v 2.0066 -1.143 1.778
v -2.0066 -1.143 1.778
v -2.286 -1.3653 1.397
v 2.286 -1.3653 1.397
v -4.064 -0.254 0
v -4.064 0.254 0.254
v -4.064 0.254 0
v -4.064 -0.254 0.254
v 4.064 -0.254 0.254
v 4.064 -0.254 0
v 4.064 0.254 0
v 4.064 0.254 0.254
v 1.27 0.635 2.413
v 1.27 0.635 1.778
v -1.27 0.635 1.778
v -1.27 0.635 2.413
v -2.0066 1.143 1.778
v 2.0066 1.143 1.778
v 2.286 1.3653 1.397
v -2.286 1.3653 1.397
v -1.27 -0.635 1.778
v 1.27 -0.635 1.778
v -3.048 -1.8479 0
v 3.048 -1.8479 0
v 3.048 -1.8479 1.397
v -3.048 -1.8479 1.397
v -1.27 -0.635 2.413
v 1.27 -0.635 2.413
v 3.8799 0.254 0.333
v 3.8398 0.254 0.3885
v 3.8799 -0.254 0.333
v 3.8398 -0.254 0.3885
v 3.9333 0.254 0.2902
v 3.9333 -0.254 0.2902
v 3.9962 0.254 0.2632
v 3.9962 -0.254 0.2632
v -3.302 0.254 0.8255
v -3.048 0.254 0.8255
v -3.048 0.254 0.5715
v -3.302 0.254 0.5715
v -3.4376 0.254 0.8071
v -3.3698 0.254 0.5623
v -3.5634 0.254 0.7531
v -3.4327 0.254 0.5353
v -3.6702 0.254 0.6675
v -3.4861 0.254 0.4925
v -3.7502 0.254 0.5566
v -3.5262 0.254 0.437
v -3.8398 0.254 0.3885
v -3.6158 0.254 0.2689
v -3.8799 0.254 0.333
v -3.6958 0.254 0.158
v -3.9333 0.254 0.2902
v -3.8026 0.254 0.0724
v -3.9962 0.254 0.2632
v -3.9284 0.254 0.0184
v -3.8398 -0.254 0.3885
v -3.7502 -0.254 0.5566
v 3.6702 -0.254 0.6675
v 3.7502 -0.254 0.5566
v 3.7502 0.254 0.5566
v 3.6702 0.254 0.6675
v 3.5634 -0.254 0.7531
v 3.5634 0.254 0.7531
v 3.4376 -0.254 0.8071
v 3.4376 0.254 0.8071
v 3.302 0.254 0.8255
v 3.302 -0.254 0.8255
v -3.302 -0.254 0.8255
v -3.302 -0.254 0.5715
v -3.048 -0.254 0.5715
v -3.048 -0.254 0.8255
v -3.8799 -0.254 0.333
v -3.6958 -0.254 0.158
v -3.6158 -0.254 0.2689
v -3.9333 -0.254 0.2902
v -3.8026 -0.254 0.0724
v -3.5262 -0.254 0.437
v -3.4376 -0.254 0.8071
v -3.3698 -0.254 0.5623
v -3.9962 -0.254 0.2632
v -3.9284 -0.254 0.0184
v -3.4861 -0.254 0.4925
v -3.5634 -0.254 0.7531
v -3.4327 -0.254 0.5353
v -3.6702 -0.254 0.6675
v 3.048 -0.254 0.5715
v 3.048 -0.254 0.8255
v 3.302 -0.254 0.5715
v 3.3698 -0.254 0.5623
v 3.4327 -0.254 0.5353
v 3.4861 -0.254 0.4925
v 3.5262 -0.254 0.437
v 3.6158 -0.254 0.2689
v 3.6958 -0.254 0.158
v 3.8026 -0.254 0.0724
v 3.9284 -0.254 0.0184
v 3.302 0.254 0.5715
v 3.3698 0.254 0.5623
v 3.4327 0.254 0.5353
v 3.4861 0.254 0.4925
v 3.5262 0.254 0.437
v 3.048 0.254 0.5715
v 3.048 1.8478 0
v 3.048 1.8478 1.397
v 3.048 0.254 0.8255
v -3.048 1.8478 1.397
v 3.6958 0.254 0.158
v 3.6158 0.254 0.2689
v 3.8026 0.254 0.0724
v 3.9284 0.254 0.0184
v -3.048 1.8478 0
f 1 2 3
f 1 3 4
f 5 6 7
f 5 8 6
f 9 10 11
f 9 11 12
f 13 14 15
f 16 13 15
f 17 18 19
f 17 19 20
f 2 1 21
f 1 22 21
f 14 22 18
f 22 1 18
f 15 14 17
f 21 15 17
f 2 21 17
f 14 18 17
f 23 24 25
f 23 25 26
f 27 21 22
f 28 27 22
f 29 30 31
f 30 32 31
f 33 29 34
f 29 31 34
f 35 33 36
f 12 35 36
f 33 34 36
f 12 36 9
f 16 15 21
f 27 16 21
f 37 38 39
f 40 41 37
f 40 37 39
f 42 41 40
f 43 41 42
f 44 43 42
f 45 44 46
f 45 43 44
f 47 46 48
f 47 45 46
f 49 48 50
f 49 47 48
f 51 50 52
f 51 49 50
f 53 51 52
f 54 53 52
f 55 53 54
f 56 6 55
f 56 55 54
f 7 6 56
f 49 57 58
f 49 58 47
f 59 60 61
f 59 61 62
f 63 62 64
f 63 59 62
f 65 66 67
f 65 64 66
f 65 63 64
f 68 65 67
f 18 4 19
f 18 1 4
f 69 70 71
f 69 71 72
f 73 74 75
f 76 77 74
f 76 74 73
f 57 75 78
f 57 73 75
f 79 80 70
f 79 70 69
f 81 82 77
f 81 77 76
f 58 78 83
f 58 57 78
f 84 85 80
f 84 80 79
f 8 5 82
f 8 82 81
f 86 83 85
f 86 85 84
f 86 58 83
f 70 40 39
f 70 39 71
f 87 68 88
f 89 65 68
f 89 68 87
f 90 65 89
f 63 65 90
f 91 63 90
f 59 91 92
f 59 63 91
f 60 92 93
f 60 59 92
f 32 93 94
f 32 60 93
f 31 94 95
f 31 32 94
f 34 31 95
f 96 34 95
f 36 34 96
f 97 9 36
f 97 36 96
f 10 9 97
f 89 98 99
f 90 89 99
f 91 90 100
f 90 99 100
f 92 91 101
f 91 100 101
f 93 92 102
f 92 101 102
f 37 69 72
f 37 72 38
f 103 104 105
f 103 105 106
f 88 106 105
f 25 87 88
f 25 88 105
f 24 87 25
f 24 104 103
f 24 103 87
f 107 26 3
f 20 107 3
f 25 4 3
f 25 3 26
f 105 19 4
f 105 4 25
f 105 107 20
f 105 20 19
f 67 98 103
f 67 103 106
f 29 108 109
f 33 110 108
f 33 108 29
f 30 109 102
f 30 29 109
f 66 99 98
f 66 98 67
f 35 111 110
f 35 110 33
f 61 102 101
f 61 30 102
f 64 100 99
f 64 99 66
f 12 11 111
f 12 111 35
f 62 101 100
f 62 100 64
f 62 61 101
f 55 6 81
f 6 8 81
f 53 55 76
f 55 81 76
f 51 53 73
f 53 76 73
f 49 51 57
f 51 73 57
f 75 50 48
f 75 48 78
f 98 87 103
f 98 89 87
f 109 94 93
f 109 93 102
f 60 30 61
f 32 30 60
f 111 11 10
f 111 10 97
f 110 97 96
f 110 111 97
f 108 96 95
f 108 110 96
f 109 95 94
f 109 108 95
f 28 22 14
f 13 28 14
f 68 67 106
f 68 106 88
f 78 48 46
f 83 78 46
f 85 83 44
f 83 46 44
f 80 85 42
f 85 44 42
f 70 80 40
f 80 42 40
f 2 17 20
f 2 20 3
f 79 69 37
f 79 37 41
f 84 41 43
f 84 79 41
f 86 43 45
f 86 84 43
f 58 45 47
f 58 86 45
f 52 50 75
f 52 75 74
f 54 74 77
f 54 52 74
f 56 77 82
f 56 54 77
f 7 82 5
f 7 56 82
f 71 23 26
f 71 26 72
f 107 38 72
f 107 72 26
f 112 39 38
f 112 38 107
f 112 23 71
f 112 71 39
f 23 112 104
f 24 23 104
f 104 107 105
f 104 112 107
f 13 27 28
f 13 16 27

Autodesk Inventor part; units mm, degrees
ref_plane "YZ Plane" through (0, 0, 0) normal (1, 0, 0) x (0, 1, 0)
ref_plane "XZ Plane" through (0, 0, 0) normal (0, 1, 0) x (-1, 0, 0)
sketch "Sketch1" plane through (0, 0, 0) normal (0, 0, 1) x (1, 0, 0)
  line L0 (3.048, -1.8479) -> (-3.048, -1.8479)
  line L1 (-3.048, -1.8479) -> (-3.048, 1.8478)
  line L2 (-3.048, 1.8478) -> (3.048, 1.8478)
  line L3 (3.048, 1.8478) -> (3.048, -1.8479)
  line L4 (3.048, -1.8479) -> (-3.048, 1.8478) construction
  line L5 (-3.048, -1.8479) -> (3.048, 1.8478) construction
  point P0 (0, 0)
  dimension "d0" = 6.096
  dimension "d1" = 3.6957
extrude "Extrusion1" add sketch "Sketch1" along normal blind 1.397
sketch "Sketch2" plane through (0, 0, 1.397) normal (0, 0, 1) x (1, 0, 0)
  line L0 (2.286, 1.3653) -> (-2.286, 1.3653)
  line L1 (-2.286, 1.3653) -> (-2.286, -1.3653)
  line L2 (-2.286, -1.3653) -> (2.286, -1.3653)
  line L3 (2.286, -1.3653) -> (2.286, 1.3653)
  line L4 (2.286, 1.3653) -> (-2.286, -1.3653) construction
  line L5 (-2.286, 1.3653) -> (2.286, -1.3653) construction
  point P0 (0, 0)
  dimension "d4" = 4.572
  dimension "d5" = 2.7305
ref_plane "Work Plane1" through (0, 0, 1.778) normal (0, 0, 1) x (1, 0, 0)
sketch "Sketch3" plane through (0, 0, 1.778) normal (0, 0, 1) x (1, 0, 0)
  line L0 (2.0066, 1.143) -> (-2.0066, 1.143)
  line L1 (-2.0066, 1.143) -> (-2.0066, -1.143)
  line L2 (-2.0066, -1.143) -> (2.0066, -1.143)
  line L3 (2.0066, -1.143) -> (2.0066, 1.143)
  line L4 (2.0066, 1.143) -> (-2.0066, -1.143) construction
  line L5 (-2.0066, 1.143) -> (2.0066, -1.143) construction
  point P0 (0, 0)
  dimension "d7" = 4.0132
  dimension "d8" = 2.286
loft "Loft1" add profiles "Sketch2", "Sketch3"
sketch "Sketch4" plane through (-2.0066, 1.143, 1.778) normal (0, 0, 1) x (1, 0, 0)
  line L0 (3.2766, -0.508) -> (0.7366, -0.508)
  line L1 (0.7366, -0.508) -> (0.7366, -1.778)
  line L2 (0.7366, -1.778) -> (3.2766, -1.778)
  line L3 (3.2766, -1.778) -> (3.2766, -0.508)
  line L4 (3.2766, -0.508) -> (0.7366, -1.778) construction
  line L5 (0.7366, -0.508) -> (3.2766, -1.778) construction
  point P0 (2.0066, -1.143)
  dimension "d13" = 2.54
  dimension "d14" = 1.27
extrude "Extrusion2" add sketch "Sketch4" along normal blind 0.635
sketch "Sketch5" plane through (0, 0, 0) normal (0, 1, 0) x (-1, 0, 0)
  line L0 (-3.048, 0) -> (-3.048, 1.397) construction
  line L1 (-3.048, 0.6985) -> (-3.302, 0.6985)
  arc A0 (-3.302, 0.6985) -> (-3.6382, 0.4968) centre (-3.302, 0.3175) ccw
  line L2 (-3.6382, 0.4968) -> (-3.7278, 0.3287)
  arc A1 (-4.064, 0.127) -> (-3.7278, 0.3287) centre (-4.064, 0.508) ccw
  line L3 (3.048, 0) -> (-3.048, 0) projected
  point P0 (0, 0)
  dimension "d17" = 1.016
  dimension "d18" = 0.127
  dimension "d19" = 0.254
  dimension "d20" = 0.381
sketch "Sketch6" plane through (3.048, -1.8479, 0) normal (1, 0, 0) x (0, 0, -1)
  line L0 (0, 0) -> (-1.397, 0) projected
  line L1 (-1.397, 0) -> (-1.397, 3.6957) projected
  line L2 (-0.8255, 2.1019) -> (-0.5715, 2.1019)
  line L3 (-0.5715, 2.1019) -> (-0.5715, 1.5939)
  line L4 (-0.5715, 1.5939) -> (-0.8255, 1.5939)
  line L5 (-0.8255, 1.5939) -> (-0.8255, 2.1019)
  line L6 (-0.8255, 2.1019) -> (-0.5715, 1.5939) construction
  line L7 (-0.5715, 2.1019) -> (-0.8255, 1.5939) construction
  point P0 (0, 1.8479)
  point P1 (-0.6985, 1.8479)
  point P2 (-0.6985, 1.8479)
  point P3 (-0.6985, 1.8479)
  dimension "d21" = 0.254
  dimension "d22" = 0.508
sweep "Sweep1" add profiles "Sketch6" path "Sketch5" path curves L1 A0 L2 A1
mirror "Mirror1" about plane through (0, 0, 0) normal (1, 0, 0) of "Sweep1"
properties part number "Switch"
